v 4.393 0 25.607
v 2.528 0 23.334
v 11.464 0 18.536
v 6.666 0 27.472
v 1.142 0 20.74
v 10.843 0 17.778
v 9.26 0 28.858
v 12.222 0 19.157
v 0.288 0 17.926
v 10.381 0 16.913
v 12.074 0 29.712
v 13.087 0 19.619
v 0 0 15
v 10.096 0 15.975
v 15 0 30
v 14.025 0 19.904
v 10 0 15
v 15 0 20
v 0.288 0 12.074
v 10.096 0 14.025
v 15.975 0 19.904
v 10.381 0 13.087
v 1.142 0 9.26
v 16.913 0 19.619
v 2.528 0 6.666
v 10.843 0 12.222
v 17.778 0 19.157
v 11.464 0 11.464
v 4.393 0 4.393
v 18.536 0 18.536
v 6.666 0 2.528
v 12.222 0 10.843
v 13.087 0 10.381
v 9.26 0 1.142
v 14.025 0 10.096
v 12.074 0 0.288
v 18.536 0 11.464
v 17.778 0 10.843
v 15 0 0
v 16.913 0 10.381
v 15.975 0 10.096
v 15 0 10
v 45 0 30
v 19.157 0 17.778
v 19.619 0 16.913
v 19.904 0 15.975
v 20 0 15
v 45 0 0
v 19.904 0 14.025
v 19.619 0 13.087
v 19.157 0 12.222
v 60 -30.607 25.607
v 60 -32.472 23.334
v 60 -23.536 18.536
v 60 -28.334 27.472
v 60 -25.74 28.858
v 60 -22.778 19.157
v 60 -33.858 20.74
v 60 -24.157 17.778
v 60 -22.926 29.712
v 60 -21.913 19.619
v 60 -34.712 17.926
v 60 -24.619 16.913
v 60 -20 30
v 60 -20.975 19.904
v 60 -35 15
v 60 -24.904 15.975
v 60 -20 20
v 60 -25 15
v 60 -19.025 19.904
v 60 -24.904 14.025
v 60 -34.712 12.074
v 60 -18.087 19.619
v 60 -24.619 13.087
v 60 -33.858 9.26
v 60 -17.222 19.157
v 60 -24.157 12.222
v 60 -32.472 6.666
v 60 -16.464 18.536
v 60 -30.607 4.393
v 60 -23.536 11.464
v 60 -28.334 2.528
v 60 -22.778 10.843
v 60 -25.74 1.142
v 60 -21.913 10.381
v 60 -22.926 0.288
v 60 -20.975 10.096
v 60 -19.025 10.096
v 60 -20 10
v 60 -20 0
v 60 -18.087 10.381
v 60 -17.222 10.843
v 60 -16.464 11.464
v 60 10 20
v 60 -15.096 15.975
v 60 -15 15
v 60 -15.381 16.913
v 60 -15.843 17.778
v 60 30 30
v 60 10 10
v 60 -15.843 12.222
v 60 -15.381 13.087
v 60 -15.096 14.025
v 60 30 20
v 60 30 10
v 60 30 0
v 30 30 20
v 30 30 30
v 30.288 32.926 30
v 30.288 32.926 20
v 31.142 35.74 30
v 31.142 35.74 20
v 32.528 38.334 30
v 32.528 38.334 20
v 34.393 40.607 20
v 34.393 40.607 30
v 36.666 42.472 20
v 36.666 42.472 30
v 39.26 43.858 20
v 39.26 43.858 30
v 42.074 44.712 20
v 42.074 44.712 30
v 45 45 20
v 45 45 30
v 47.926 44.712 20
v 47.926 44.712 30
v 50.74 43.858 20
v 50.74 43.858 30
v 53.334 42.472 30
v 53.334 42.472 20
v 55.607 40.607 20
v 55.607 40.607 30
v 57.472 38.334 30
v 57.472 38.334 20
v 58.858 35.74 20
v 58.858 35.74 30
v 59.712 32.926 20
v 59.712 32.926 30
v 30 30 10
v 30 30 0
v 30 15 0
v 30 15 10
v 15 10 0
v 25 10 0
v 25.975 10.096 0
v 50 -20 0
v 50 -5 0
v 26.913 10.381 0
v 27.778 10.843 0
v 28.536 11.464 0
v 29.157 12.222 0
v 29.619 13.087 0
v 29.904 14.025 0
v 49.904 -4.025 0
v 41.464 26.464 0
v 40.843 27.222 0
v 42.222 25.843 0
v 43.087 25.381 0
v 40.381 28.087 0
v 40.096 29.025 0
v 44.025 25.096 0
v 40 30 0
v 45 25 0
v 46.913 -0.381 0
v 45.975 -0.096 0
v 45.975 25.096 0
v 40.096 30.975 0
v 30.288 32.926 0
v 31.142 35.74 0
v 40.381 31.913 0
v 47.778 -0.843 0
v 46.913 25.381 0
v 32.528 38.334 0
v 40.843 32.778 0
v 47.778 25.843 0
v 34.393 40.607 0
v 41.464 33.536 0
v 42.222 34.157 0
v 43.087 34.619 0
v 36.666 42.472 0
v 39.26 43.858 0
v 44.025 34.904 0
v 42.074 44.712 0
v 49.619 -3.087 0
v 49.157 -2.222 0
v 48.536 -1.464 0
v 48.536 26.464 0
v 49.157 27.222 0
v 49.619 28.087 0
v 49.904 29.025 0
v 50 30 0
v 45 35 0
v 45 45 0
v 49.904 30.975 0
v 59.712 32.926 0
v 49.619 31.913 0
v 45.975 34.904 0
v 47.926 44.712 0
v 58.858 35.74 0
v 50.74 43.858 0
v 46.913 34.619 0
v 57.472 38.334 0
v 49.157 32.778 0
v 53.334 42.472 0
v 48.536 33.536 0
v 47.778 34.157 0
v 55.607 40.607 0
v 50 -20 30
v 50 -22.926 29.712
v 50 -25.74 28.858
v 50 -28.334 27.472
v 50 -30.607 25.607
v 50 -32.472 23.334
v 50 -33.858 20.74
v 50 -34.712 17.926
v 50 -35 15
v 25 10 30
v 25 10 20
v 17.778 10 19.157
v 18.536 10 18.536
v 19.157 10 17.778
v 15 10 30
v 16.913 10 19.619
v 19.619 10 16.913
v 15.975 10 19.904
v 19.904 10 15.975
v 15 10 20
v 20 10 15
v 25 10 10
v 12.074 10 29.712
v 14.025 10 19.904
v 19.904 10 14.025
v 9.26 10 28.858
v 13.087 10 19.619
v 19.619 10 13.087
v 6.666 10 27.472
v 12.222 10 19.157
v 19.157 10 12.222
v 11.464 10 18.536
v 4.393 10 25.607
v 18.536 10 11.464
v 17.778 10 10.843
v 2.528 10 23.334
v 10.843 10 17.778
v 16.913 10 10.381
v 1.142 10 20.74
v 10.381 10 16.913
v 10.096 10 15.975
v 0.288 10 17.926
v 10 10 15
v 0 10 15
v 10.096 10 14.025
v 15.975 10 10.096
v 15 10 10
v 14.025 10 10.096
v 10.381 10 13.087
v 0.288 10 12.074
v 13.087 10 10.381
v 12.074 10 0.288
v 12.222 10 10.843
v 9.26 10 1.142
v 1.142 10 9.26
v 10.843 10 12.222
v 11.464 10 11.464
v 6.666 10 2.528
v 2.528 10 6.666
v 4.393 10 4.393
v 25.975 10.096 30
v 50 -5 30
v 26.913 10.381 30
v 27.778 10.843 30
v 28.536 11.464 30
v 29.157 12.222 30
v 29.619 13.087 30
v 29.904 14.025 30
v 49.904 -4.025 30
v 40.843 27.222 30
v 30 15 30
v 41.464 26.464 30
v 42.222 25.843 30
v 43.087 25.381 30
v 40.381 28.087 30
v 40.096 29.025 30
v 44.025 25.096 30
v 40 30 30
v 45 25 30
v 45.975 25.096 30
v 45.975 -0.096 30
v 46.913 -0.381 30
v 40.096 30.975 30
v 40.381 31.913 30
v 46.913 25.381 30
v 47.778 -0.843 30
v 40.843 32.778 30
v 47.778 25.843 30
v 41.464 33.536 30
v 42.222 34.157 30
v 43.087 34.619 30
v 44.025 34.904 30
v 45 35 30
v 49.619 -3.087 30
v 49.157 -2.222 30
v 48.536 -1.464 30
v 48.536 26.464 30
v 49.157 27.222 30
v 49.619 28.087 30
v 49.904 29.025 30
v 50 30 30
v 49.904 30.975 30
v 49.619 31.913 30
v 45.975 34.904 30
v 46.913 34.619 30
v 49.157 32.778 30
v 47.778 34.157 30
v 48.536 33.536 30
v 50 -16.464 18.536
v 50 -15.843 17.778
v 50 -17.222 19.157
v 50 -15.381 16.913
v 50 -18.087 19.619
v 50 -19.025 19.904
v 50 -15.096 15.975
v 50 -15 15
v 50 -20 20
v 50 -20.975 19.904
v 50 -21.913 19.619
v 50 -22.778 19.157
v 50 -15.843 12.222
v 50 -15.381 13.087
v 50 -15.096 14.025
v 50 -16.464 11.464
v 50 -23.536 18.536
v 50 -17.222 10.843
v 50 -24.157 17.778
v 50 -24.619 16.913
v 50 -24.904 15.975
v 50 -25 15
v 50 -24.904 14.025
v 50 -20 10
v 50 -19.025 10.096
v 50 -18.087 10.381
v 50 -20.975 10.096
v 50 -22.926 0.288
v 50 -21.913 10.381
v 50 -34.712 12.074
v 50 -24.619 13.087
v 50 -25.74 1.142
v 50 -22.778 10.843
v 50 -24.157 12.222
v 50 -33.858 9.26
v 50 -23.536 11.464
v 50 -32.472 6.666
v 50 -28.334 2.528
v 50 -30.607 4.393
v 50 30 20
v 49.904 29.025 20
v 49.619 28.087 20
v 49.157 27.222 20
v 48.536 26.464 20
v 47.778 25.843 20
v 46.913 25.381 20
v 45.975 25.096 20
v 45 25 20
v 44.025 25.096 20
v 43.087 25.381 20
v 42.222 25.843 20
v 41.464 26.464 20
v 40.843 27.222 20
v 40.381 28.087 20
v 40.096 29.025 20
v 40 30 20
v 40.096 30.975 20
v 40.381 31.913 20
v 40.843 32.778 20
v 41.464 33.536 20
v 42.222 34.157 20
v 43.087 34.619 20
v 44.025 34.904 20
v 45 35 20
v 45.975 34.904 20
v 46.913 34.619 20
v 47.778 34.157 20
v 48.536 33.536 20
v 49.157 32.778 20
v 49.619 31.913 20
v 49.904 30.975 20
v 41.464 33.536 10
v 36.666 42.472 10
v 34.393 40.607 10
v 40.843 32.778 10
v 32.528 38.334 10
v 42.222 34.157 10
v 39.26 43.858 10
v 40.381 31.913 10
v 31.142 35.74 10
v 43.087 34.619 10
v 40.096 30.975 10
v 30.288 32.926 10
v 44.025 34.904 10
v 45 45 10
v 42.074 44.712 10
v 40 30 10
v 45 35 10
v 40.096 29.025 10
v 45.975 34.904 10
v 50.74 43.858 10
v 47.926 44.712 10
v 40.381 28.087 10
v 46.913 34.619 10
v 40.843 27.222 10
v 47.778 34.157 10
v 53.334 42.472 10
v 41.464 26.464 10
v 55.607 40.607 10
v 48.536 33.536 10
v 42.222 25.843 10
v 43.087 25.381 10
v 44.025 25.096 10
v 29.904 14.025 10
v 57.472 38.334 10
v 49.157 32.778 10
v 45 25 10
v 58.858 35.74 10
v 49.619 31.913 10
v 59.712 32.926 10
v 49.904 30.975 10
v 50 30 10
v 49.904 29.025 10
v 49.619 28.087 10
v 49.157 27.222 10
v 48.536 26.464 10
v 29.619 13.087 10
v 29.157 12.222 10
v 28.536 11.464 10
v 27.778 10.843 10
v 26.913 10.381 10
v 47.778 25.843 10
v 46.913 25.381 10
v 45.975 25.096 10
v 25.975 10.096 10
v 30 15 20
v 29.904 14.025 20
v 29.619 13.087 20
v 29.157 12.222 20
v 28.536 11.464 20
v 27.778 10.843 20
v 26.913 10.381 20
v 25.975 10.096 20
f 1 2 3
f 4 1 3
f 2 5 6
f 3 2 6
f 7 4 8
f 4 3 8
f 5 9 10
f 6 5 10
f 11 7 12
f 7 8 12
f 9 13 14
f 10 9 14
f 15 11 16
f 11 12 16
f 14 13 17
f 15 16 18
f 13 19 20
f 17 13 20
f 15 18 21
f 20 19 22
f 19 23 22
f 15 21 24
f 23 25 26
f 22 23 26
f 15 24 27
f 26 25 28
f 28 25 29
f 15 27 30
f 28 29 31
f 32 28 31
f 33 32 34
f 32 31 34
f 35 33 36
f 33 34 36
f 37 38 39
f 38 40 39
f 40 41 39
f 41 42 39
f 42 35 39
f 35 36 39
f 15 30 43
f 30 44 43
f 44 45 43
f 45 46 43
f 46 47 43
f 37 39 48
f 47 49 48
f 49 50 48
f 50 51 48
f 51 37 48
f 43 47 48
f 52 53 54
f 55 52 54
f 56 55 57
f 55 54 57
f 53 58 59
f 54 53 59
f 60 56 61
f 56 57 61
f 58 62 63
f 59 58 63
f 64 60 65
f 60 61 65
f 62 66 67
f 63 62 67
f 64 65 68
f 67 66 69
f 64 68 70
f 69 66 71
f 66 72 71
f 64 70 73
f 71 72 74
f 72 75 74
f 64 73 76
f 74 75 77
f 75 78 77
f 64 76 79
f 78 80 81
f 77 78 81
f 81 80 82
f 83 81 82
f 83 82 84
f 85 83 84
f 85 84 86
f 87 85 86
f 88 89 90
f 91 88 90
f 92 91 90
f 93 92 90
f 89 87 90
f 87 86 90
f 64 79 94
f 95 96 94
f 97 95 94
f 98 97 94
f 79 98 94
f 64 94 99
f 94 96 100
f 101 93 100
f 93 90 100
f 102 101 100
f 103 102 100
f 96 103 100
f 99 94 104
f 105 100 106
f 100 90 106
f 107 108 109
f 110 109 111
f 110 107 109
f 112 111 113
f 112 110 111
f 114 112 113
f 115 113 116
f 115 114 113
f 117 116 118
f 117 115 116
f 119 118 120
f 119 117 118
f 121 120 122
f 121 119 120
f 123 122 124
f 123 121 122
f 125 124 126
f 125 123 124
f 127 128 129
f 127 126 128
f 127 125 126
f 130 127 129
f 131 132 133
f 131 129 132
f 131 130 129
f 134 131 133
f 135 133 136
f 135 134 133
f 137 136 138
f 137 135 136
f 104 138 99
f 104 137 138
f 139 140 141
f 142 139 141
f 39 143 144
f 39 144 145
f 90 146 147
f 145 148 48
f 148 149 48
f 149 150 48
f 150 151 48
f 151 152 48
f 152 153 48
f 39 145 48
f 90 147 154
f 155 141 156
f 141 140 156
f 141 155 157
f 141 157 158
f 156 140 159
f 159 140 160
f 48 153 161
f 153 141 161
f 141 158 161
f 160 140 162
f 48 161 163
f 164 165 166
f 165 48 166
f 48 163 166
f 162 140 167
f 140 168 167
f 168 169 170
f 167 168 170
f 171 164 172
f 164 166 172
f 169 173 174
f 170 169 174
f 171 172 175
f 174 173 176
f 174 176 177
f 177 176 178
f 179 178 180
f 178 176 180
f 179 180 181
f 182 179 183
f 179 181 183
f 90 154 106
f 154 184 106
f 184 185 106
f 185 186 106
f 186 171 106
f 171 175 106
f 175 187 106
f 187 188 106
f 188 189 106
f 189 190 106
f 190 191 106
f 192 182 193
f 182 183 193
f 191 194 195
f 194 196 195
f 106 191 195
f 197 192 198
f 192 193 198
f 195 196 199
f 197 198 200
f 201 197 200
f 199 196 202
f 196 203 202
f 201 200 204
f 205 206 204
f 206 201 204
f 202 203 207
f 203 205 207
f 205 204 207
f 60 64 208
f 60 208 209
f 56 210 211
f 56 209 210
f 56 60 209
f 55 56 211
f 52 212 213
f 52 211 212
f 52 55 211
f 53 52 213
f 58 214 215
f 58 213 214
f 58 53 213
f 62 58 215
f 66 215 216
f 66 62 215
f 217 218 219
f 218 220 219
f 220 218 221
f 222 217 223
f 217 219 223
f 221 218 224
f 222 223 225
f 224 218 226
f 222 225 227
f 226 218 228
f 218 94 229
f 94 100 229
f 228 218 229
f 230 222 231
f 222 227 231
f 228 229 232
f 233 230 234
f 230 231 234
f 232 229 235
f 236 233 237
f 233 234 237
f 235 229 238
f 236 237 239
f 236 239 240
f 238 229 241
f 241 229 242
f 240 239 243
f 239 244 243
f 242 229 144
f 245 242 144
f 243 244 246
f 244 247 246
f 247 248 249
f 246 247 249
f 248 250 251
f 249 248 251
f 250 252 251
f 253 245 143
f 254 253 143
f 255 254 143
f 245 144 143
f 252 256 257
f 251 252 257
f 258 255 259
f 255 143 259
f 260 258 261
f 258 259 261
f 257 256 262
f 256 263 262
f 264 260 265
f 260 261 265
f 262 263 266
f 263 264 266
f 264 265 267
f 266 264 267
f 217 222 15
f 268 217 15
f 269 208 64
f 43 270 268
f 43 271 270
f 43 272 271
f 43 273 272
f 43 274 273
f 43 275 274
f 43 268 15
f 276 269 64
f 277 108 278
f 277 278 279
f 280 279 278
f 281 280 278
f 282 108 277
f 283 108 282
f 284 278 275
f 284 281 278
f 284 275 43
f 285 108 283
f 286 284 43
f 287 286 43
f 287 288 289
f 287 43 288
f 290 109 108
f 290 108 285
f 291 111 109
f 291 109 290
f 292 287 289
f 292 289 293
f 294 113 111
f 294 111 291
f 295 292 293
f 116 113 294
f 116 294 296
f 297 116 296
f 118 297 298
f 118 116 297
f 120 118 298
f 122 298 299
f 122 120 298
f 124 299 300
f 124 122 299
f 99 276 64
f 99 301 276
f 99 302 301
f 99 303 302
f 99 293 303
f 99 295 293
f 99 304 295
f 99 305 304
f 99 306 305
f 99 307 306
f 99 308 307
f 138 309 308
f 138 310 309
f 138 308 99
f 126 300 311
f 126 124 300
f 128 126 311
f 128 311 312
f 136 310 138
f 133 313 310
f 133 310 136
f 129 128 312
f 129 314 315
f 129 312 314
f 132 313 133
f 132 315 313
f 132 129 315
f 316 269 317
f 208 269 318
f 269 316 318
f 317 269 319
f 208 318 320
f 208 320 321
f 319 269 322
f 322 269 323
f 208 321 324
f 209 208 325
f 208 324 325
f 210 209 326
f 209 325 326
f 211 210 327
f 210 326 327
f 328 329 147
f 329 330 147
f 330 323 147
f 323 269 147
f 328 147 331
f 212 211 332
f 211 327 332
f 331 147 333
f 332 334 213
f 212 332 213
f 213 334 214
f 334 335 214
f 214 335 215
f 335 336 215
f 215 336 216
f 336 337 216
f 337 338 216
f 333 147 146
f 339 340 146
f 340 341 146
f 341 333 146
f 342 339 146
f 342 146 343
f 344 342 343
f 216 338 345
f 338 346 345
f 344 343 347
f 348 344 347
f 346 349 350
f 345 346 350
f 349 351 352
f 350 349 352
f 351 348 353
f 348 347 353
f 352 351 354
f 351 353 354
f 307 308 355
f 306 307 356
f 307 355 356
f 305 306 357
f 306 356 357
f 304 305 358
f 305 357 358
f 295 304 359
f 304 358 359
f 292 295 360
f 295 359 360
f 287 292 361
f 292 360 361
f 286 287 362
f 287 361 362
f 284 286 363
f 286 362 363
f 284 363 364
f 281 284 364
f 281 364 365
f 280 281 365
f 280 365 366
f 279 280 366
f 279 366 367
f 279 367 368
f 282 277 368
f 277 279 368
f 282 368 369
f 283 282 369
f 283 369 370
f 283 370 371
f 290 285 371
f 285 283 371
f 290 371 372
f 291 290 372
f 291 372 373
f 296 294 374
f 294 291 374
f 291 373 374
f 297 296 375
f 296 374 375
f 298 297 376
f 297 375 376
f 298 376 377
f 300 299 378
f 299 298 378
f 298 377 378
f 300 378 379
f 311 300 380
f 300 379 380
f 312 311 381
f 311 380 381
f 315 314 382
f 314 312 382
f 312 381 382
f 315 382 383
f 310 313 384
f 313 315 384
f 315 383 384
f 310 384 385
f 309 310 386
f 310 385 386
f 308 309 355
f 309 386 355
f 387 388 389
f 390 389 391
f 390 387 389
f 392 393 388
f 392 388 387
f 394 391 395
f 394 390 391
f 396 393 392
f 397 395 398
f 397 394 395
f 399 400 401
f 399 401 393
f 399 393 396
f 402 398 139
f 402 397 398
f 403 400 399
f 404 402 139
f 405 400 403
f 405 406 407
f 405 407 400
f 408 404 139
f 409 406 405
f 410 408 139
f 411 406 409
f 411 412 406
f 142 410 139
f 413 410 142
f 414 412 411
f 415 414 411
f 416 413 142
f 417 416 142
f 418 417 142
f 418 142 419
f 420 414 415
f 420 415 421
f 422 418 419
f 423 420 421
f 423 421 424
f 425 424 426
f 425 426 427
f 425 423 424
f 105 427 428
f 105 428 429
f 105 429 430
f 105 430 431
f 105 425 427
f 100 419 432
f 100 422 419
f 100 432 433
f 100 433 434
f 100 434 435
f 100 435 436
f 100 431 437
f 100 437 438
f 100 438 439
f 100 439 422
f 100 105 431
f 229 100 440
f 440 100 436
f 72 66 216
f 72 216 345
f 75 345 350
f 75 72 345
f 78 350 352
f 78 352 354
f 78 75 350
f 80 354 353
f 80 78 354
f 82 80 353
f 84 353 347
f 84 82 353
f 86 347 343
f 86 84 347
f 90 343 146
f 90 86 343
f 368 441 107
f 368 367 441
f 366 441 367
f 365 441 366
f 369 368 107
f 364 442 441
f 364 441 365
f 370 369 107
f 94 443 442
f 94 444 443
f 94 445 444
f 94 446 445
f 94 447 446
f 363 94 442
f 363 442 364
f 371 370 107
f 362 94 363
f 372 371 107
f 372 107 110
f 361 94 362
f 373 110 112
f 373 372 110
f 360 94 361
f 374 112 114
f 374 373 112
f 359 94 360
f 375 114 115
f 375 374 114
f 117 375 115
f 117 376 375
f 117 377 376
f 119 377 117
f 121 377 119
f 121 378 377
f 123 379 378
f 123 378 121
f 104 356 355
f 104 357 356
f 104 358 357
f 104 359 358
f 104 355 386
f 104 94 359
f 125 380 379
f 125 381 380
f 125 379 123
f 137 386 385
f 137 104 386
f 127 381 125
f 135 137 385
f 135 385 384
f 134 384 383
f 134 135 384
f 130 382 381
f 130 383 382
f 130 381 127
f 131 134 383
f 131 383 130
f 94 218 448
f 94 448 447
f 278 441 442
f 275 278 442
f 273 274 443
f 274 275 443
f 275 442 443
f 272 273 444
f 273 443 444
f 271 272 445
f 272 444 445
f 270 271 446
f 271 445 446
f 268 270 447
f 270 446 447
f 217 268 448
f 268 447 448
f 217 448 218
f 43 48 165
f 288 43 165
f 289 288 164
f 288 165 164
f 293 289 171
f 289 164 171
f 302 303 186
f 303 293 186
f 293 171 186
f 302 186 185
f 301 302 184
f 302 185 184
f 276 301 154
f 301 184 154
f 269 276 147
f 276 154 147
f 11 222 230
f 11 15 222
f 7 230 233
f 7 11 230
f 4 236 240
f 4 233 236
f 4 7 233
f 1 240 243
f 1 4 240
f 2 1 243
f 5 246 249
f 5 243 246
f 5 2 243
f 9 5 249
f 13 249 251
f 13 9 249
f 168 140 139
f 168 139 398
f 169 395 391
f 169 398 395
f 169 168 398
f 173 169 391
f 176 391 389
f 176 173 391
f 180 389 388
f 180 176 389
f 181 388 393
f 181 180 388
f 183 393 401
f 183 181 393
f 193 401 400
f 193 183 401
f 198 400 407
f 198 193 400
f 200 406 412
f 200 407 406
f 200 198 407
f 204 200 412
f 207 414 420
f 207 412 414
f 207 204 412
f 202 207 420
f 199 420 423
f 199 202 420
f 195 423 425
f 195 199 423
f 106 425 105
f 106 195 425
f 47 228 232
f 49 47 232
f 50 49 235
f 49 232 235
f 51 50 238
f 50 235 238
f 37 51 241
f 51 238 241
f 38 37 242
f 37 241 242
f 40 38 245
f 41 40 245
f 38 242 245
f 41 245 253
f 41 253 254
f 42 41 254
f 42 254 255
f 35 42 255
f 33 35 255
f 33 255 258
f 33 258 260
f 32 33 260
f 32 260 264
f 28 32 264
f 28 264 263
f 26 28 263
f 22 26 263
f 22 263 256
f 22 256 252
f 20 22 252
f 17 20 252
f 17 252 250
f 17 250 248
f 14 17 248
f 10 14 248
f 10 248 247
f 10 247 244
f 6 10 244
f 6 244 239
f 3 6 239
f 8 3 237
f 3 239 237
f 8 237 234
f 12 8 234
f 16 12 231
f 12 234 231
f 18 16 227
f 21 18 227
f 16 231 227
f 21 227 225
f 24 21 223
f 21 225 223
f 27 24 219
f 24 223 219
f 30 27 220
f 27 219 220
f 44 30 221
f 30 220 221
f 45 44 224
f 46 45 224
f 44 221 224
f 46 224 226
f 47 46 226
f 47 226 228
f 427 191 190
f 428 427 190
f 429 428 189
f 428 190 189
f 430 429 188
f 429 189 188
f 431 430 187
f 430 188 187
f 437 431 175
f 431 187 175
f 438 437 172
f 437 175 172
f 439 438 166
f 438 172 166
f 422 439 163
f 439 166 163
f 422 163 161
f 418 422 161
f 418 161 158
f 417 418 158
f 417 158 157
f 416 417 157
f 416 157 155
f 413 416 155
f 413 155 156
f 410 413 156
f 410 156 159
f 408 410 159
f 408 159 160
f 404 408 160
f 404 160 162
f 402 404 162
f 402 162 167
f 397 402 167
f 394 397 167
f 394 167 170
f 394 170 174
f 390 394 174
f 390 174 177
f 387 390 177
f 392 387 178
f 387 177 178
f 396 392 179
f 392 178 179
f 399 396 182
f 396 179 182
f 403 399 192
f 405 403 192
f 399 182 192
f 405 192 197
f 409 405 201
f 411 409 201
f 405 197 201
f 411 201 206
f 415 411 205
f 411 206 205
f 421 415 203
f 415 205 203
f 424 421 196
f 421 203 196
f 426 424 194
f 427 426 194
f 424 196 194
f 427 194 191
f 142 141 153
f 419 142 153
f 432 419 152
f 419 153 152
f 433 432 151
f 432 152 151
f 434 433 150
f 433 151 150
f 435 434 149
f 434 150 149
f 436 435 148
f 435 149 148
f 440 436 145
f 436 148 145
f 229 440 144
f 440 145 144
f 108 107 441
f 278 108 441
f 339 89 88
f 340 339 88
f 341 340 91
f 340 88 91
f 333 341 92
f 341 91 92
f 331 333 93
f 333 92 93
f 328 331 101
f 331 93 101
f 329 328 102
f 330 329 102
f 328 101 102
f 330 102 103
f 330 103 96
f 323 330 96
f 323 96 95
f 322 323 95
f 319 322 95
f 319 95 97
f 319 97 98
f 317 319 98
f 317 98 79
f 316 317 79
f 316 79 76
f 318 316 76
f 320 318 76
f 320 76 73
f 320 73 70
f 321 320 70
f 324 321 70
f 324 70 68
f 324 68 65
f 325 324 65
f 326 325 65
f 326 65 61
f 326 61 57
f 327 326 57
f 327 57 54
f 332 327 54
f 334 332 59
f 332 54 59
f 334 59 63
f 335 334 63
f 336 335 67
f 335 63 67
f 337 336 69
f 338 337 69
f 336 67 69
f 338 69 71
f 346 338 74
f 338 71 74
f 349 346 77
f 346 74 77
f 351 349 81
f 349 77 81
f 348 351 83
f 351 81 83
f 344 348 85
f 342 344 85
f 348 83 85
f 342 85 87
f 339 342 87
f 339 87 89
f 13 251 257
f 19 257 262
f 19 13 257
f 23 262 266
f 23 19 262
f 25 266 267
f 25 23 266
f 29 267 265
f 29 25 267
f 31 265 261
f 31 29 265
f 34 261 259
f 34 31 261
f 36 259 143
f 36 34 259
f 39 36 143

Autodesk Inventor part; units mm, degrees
ref_plane "YZ Plane" through (0, 0, 0) normal (1, 0, 0) x (0, 1, 0)
ref_plane "XZ Plane" through (0, 0, 0) normal (0, 1, 0) x (-1, 0, 0)
ref_plane "XY Plane" through (0, 0, 0) normal (0, 0, 1) x (1, 0, 0)
sketch "Sketch1" plane through (0, 0, 0) normal (0, 0, 1) x (1, 0, 0)
  line L0 (0, 0) -> (45, 0)
  line L1 (50, -5) -> (50, -35)
  line L2 (50, -35) -> (60, -35)
  line L3 (60, -35) -> (60, 30)
  arc A0 (60, 30) -> (30, 30) centre (45, 30) ccw
  line L4 (30, 30) -> (30, 15.6159)
  line L5 (30, 15.6159) -> (30, 15)
  arc A1 (25, 10) -> (30, 15) centre (25, 15) ccw
  line L6 (25, 10) -> (0, 10)
  line L7 (0, 10) -> (0, 0)
  arc A2 (50, -5) -> (45, 0) centre (45, -5) ccw
  circle A3 centre (45, 30) radius 5
  dimension "d0" = 5
  dimension "d1" = 10
  dimension "d2" = 30
  dimension "d3" = 10
  dimension "d4" = 10
  dimension "d5" = 60
  dimension "d6" = 35
  dimension "d7" = 65
extrude "Extrusion1" add sketch "Sketch1" along normal blind 30
fillet "Fillet1" radius 15 4 edges at (0, 5, 30) (0, 5, 0) (55, -35, 30) (55, -35, 0)
sketch "Sketch2" plane through (60, 30, 30) normal (1, 0, 0) x (0, 0, -1)
  arc A0 (0, -50) -> (30, -50) centre (15, -50) ccw projected
  circle A1 centre (15, -50) radius 5
  line L0 (20, 15) -> (20, -20)
  line L1 (20, -20) -> (10, -20)
  line L2 (10, -20) -> (10, 15)
  line L3 (30, 15) -> (0, 15) projected
  line L4 (30, 15) -> (30, 0) projected
  line L5 (30, -20) -> (0, -20) projected
  point P0 (30, -30)
  point P1 (15, -20)
  point P2 (15, 15)
  point P3 (20, 15)
  dimension "d11" = 10
  dimension "d12" = 10
extrude "Extrusion2" cut sketch "Sketch2" against normal through all
sketch "Sketch3" plane through (15, 10, 0) normal (0, 1, 0) x (1, 0, 0)
  arc A0 (0, 0) -> (0, -30) centre (0, -15) ccw projected
  circle A1 centre (0, -15) radius 5
  point P0 (-15, 0)
  dimension "d15" = 10
extrude "Extrusion3" cut sketch "Sketch3" against normal through all
properties part number "b5"
